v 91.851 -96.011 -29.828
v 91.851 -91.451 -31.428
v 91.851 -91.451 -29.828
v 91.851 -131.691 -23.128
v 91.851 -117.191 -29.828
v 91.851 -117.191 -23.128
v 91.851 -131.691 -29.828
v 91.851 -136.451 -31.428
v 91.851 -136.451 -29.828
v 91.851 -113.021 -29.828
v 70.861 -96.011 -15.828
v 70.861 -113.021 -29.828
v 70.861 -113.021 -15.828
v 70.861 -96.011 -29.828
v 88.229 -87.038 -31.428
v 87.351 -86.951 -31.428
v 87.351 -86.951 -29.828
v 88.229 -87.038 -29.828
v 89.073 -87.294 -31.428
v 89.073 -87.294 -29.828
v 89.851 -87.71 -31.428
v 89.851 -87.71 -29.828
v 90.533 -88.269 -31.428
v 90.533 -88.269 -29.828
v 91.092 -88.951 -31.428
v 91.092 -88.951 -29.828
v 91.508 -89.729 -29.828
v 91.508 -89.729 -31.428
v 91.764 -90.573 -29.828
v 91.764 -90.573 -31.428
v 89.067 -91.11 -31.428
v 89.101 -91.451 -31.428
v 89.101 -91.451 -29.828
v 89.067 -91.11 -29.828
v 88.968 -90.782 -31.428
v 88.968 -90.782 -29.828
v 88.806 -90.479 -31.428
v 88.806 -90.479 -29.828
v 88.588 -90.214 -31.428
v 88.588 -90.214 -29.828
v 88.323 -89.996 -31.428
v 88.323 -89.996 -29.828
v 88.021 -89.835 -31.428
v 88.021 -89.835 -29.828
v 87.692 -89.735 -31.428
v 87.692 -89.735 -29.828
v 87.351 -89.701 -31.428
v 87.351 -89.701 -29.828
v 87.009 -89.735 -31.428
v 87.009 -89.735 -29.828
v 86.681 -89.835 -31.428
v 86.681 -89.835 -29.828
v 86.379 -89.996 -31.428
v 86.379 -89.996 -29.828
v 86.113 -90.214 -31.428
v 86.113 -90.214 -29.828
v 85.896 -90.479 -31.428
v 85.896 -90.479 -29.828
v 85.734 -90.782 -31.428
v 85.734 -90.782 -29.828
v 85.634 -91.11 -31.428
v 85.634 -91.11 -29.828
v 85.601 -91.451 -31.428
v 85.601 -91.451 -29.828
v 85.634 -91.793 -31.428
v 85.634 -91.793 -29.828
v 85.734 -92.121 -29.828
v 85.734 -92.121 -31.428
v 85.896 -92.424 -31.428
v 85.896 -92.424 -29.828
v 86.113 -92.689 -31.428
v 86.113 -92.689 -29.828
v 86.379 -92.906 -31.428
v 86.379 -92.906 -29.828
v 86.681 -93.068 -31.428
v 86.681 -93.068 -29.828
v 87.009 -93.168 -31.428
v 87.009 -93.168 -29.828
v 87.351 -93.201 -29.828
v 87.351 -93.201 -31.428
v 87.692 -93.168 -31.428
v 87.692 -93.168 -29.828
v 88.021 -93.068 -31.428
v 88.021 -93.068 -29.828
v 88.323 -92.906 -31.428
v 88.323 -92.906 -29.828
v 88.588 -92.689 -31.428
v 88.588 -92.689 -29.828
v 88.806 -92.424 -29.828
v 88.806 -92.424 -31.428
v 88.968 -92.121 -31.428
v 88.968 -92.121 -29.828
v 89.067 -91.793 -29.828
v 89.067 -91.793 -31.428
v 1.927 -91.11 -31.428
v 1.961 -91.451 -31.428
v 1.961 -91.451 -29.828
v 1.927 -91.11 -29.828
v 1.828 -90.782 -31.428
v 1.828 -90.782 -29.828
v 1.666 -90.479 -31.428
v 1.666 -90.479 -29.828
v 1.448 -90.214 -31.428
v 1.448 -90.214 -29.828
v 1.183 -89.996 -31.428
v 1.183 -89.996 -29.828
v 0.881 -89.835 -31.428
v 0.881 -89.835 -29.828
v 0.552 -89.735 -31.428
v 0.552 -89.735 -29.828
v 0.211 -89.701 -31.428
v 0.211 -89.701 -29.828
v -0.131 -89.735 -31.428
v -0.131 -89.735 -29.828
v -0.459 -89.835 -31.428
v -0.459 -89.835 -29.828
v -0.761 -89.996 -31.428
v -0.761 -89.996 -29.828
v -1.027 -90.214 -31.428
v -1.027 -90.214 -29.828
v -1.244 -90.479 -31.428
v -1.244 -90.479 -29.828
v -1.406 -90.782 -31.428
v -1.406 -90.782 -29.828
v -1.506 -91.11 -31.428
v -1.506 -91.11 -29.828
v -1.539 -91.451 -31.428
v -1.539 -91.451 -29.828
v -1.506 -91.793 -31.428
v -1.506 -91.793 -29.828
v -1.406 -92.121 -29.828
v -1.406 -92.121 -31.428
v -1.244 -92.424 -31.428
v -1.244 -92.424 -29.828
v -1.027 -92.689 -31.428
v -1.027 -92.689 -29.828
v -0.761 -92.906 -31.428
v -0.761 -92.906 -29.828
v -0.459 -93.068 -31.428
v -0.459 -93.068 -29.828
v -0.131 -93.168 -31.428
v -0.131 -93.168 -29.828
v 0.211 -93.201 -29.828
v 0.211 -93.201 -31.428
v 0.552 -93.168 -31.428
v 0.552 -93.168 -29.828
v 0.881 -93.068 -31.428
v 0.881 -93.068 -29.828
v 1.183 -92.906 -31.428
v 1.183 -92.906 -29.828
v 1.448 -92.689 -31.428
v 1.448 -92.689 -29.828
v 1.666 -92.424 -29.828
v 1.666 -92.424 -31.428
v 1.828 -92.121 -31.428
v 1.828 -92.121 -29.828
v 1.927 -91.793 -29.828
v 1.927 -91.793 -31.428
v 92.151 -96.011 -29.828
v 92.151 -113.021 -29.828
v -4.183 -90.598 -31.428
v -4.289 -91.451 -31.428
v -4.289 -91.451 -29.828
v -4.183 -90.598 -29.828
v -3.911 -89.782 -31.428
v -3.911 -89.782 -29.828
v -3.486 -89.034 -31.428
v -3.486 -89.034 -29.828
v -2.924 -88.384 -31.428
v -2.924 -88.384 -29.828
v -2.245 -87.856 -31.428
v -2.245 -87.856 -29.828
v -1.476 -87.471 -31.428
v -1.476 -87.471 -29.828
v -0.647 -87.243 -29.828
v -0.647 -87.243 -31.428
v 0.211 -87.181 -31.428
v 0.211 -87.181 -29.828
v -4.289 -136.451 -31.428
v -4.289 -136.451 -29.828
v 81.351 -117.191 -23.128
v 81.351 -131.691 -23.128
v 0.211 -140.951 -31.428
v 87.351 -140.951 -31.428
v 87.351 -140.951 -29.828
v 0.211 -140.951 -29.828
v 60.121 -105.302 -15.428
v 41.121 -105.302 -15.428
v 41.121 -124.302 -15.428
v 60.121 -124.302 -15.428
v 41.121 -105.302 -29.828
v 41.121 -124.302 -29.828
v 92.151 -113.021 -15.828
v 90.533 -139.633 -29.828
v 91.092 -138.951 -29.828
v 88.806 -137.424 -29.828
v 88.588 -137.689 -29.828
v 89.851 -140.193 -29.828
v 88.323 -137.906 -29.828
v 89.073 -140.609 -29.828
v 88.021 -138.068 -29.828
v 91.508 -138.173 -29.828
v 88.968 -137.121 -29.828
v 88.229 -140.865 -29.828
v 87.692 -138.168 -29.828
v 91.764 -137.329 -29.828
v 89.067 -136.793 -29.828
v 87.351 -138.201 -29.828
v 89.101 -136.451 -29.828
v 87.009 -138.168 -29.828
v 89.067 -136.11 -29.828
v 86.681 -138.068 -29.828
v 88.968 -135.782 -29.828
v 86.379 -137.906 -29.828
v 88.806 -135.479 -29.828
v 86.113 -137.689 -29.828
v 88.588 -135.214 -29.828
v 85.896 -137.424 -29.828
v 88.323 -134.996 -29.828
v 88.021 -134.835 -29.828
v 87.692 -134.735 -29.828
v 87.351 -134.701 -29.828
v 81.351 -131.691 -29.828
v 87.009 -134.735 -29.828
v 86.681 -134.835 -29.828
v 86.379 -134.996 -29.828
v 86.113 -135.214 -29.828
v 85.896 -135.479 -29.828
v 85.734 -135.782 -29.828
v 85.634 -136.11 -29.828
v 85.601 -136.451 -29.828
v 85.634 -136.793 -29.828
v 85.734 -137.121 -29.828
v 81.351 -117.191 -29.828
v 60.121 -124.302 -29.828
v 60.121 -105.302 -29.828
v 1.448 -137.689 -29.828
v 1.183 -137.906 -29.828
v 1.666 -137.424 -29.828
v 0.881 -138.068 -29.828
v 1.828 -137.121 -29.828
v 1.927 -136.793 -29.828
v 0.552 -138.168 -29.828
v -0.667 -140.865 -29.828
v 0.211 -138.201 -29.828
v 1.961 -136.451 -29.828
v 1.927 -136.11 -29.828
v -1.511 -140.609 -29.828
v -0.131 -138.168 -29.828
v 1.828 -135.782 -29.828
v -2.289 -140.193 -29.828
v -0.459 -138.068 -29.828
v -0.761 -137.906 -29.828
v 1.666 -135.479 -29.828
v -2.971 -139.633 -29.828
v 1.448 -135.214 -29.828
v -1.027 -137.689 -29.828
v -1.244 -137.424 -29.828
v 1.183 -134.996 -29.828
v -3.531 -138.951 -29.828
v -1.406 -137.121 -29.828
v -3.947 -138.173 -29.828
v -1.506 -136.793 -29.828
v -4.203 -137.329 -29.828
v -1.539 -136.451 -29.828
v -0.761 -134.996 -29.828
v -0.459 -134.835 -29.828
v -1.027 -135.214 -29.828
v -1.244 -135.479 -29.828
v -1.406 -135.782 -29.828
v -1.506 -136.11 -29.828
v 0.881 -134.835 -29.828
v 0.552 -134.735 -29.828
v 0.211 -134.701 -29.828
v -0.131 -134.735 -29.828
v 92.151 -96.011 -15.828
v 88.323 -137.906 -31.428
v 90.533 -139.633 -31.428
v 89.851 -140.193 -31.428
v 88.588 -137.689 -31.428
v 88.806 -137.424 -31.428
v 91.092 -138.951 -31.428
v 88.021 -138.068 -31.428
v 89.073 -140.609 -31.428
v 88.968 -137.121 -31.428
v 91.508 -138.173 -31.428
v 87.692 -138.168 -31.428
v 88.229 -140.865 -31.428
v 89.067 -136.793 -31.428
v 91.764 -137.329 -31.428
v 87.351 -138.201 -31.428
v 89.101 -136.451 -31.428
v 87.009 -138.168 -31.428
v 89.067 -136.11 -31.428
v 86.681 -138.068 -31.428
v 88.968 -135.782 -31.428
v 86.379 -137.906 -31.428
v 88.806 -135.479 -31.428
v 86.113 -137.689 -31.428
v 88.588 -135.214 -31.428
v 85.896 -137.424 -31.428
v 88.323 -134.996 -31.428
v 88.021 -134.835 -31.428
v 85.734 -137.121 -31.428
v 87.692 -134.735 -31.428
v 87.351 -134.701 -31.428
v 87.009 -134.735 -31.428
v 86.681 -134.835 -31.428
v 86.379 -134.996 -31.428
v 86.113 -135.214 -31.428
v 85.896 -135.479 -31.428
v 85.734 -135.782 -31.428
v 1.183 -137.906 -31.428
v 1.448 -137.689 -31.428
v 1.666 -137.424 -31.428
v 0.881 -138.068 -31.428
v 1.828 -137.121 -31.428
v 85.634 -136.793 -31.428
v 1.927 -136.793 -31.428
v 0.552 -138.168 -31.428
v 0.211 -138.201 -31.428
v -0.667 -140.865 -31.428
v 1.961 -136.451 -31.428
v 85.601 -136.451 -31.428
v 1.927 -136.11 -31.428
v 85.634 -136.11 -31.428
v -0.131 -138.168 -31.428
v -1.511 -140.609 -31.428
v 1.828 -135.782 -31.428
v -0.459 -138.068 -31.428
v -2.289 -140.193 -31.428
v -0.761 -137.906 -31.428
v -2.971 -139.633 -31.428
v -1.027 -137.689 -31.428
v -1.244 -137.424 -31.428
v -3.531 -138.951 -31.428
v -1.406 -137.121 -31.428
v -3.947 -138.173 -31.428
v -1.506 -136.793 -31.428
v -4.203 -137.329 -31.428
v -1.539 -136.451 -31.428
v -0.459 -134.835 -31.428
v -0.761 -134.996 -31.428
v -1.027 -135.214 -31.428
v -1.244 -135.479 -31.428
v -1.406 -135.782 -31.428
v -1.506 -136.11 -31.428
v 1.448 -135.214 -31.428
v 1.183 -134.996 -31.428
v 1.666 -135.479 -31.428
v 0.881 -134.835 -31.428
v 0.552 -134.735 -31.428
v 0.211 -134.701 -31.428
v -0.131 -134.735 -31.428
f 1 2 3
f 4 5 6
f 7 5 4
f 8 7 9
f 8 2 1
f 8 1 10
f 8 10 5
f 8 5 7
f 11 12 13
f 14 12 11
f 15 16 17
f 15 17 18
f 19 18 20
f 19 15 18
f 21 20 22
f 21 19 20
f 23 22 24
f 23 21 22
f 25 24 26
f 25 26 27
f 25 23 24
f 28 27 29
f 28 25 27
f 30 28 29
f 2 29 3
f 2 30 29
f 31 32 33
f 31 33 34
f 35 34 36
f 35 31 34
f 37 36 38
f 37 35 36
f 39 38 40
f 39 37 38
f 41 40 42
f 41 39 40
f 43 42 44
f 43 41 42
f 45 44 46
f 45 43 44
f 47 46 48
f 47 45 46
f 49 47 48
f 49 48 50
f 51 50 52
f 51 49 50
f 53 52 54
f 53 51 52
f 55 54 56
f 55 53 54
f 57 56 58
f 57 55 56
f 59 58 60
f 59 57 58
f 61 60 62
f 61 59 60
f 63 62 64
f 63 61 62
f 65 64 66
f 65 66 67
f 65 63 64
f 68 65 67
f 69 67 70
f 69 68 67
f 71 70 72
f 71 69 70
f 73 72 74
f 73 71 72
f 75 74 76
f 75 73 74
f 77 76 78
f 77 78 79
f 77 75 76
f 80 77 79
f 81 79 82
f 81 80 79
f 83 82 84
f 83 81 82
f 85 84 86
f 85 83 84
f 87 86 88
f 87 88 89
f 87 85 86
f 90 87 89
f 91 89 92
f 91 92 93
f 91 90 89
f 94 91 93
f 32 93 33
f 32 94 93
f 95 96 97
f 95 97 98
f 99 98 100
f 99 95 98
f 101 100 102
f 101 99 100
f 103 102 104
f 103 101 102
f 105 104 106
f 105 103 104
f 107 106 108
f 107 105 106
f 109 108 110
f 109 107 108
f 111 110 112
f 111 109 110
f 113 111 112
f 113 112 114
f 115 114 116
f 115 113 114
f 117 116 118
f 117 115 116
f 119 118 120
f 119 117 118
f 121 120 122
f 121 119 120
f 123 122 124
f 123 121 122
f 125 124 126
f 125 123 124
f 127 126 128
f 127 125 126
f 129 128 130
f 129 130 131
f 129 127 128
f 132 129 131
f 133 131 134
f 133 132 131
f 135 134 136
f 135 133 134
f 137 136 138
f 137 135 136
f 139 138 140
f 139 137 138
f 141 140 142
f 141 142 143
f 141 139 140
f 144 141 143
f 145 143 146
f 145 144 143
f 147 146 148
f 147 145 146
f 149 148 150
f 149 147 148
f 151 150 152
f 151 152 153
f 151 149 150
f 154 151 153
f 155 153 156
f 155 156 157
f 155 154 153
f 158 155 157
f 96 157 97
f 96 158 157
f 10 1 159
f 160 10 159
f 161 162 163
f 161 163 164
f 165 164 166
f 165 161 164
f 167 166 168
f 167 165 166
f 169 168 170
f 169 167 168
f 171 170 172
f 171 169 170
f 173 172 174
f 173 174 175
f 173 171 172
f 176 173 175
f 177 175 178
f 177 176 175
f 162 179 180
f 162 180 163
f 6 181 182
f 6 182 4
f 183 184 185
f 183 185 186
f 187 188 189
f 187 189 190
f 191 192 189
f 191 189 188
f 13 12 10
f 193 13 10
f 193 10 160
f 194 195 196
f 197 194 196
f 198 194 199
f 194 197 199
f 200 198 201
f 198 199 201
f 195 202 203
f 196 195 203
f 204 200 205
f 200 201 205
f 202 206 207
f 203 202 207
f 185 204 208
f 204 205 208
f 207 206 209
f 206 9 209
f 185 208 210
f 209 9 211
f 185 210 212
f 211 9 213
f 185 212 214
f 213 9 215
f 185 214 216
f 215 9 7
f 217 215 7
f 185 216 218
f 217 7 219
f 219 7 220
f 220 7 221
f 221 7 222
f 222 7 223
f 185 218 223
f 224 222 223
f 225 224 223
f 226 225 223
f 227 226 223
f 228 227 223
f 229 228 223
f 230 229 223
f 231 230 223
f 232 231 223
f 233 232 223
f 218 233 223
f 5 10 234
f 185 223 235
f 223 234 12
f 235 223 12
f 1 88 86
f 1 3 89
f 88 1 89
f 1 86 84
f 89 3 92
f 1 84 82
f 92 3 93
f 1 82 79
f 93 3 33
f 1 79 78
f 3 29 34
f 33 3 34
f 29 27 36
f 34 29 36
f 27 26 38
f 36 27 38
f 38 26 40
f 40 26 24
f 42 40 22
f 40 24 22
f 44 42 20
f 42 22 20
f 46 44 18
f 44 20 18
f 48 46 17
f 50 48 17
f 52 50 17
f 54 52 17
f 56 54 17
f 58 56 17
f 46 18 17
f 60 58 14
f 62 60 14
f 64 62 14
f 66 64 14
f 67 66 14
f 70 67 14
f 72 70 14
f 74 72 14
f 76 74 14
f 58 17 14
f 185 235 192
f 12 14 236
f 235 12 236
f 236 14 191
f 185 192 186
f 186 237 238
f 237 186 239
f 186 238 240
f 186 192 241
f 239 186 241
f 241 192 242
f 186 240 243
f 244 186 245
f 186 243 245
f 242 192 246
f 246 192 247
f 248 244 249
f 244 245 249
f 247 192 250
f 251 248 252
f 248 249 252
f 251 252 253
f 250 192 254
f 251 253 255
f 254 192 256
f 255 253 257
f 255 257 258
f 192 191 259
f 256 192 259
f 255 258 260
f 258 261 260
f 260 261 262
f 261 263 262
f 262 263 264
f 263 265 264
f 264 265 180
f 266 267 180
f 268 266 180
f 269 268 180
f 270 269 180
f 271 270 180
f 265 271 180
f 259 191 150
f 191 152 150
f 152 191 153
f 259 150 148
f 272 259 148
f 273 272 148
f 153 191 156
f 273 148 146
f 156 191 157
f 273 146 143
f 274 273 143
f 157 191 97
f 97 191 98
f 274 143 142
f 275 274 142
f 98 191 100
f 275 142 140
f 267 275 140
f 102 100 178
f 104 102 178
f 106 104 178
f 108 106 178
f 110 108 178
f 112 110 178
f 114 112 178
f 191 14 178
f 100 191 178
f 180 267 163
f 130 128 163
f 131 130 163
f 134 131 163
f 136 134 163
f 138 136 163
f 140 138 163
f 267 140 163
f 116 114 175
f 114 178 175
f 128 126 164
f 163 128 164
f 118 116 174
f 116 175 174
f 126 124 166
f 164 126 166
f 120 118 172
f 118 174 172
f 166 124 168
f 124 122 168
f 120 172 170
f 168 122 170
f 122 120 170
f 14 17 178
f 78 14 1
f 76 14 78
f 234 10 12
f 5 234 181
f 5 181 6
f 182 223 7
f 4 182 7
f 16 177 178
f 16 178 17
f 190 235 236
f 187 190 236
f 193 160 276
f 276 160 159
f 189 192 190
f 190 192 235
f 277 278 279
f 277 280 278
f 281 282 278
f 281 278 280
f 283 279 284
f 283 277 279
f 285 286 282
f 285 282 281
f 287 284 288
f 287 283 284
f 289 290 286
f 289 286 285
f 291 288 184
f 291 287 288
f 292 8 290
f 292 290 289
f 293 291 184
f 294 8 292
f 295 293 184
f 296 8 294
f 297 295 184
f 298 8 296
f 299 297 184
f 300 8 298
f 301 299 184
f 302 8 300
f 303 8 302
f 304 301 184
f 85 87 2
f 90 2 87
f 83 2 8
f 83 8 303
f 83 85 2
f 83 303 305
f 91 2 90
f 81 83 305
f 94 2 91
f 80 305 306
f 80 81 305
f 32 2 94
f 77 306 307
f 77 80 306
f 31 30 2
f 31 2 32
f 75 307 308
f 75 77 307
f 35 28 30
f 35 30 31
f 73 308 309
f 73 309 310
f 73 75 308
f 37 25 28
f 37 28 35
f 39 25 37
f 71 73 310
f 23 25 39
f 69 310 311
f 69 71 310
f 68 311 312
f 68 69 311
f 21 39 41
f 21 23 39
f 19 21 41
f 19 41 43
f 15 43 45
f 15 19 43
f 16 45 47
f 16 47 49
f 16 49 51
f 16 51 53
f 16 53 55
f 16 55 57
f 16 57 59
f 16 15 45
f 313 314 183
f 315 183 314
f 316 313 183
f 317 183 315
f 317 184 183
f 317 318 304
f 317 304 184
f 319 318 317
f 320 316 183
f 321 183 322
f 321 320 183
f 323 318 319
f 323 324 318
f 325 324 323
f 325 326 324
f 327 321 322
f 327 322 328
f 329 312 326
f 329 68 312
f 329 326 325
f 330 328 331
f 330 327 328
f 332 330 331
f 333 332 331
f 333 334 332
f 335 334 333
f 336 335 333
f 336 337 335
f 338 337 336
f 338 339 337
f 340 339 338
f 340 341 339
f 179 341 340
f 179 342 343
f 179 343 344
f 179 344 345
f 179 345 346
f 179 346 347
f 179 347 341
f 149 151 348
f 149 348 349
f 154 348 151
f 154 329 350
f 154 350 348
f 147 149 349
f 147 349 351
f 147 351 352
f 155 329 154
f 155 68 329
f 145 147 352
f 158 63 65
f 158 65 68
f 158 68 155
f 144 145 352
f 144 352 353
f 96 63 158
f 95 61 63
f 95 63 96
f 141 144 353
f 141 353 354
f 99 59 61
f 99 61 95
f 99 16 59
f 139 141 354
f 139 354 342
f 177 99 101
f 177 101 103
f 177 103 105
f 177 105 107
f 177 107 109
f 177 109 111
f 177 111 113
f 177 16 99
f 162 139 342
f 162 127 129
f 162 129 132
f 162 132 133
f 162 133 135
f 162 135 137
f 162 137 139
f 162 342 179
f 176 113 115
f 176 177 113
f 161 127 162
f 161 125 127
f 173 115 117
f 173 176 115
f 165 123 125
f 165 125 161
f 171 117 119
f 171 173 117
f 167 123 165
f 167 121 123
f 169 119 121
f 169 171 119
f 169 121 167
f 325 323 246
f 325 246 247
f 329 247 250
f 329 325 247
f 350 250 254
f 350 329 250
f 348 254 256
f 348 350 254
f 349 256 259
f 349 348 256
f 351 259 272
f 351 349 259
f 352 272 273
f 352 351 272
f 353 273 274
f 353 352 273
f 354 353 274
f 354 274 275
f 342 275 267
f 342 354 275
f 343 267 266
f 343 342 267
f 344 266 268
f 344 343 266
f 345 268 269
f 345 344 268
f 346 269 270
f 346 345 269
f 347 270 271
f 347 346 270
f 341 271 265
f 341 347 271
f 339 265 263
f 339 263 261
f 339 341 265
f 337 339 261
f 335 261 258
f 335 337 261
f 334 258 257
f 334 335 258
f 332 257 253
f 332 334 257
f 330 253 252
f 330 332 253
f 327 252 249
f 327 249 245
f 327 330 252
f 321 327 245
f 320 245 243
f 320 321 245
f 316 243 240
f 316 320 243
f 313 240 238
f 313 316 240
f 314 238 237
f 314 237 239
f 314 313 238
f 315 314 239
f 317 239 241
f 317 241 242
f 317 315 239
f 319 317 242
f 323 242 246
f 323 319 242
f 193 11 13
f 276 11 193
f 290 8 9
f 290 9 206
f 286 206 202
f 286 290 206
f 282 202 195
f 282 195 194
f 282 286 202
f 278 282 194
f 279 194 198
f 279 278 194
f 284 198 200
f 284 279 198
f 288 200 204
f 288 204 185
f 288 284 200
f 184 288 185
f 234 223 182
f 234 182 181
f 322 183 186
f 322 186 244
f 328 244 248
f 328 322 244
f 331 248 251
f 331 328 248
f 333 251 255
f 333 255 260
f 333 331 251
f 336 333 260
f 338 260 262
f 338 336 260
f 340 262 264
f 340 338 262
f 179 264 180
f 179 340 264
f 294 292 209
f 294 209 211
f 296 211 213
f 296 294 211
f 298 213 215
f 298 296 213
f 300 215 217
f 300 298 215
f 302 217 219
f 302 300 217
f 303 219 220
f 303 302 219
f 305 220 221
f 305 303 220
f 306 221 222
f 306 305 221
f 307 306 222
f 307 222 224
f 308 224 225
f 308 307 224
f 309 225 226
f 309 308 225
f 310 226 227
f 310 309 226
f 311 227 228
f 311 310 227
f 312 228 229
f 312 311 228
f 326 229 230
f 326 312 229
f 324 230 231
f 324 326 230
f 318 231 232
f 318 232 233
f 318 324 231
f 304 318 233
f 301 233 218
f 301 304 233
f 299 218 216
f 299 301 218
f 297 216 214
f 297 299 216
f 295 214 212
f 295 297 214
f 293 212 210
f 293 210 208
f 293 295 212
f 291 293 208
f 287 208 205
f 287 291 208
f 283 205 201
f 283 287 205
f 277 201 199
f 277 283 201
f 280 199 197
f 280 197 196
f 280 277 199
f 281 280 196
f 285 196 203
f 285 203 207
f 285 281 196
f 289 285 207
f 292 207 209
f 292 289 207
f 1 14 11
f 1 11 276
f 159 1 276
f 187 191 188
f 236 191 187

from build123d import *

# Parameters (mm, degrees)
PCB_R              = 1.75
BOARD_DEPTH        = 1.6
GIGE_W             = 21.29
GIGE_H             = 17.01
ETHERNETPORT_DEPTH = 14
HDMI_W             = 10.5
HDMI_H             = 14.5
HDMIPORT_DEPTH     = 6.7
SKETCH9_W          = 19
SKETCH9_H          = 19
FPGAANDFAN_DEPTH   = 14.4


with BuildPart() as part:
    # pcb → board (new body)
    with BuildSketch(Plane.XY.offset(-31.428393775)):
        with BuildLine():
            Line((91.850829578, -91.451333311), (91.850829578, -136.451333311))
            ThreePointArc((91.850829578, -136.451333311), (90.532810093, -139.633313826), (87.350829578, -140.951333311))
            Line((87.350829578, -140.951333311), (0.210829578, -140.951333311))
            ThreePointArc((0.210829578, -140.951333311), (-2.971150937, -139.633313826), (-4.289170422, -136.451333311))
            Line((-4.289170422, -136.451333311), (-4.289170422, -91.451333311))
            ThreePointArc((-4.289170422, -91.451333311), (-2.923602921, -88.384143861), (0.210829578, -87.180915442))
            Line((0.210829578, -87.180915442), (87.350829578, -86.951333311))
            ThreePointArc((87.350829578, -86.951333311), (90.532810093, -88.269352795), (91.850829578, -91.451333311))
        make_face()
        with Locations((87.350829578, -136.451333311)):
            Circle(PCB_R, mode=Mode.SUBTRACT)
        with Locations((87.350829578, -91.451333311)):
            Circle(PCB_R, mode=Mode.SUBTRACT)
        with Locations((0.210829578, -91.451333311)):
            Circle(PCB_R, mode=Mode.SUBTRACT)
        with Locations((0.210829578, -136.451333311)):
            Circle(PCB_R, mode=Mode.SUBTRACT)
    extrude(amount=BOARD_DEPTH)

    # gige → ethernetport (add)
    with BuildSketch(Plane.XY.offset(-29.828393775)):
        with Locations((81.505829578, -104.516333311)):
            Rectangle(GIGE_W, GIGE_H)
    extrude(amount=ETHERNETPORT_DEPTH)

    # hdmi → hdmiport (add)
    with BuildSketch(Plane.XY.offset(-29.828393775)):
        with Locations((86.600829578, -124.441333311)):
            Rectangle(HDMI_W, HDMI_H)
    extrude(amount=HDMIPORT_DEPTH)

    # Sketch9 → FPGAandFan (add)
    with BuildSketch(Plane.XY.offset(-29.828393775)):
        with Locations((50.620829578, -114.802468161)):
            Rectangle(SKETCH9_W, SKETCH9_H)
    extrude(amount=FPGAANDFAN_DEPTH)


solid = part.part
